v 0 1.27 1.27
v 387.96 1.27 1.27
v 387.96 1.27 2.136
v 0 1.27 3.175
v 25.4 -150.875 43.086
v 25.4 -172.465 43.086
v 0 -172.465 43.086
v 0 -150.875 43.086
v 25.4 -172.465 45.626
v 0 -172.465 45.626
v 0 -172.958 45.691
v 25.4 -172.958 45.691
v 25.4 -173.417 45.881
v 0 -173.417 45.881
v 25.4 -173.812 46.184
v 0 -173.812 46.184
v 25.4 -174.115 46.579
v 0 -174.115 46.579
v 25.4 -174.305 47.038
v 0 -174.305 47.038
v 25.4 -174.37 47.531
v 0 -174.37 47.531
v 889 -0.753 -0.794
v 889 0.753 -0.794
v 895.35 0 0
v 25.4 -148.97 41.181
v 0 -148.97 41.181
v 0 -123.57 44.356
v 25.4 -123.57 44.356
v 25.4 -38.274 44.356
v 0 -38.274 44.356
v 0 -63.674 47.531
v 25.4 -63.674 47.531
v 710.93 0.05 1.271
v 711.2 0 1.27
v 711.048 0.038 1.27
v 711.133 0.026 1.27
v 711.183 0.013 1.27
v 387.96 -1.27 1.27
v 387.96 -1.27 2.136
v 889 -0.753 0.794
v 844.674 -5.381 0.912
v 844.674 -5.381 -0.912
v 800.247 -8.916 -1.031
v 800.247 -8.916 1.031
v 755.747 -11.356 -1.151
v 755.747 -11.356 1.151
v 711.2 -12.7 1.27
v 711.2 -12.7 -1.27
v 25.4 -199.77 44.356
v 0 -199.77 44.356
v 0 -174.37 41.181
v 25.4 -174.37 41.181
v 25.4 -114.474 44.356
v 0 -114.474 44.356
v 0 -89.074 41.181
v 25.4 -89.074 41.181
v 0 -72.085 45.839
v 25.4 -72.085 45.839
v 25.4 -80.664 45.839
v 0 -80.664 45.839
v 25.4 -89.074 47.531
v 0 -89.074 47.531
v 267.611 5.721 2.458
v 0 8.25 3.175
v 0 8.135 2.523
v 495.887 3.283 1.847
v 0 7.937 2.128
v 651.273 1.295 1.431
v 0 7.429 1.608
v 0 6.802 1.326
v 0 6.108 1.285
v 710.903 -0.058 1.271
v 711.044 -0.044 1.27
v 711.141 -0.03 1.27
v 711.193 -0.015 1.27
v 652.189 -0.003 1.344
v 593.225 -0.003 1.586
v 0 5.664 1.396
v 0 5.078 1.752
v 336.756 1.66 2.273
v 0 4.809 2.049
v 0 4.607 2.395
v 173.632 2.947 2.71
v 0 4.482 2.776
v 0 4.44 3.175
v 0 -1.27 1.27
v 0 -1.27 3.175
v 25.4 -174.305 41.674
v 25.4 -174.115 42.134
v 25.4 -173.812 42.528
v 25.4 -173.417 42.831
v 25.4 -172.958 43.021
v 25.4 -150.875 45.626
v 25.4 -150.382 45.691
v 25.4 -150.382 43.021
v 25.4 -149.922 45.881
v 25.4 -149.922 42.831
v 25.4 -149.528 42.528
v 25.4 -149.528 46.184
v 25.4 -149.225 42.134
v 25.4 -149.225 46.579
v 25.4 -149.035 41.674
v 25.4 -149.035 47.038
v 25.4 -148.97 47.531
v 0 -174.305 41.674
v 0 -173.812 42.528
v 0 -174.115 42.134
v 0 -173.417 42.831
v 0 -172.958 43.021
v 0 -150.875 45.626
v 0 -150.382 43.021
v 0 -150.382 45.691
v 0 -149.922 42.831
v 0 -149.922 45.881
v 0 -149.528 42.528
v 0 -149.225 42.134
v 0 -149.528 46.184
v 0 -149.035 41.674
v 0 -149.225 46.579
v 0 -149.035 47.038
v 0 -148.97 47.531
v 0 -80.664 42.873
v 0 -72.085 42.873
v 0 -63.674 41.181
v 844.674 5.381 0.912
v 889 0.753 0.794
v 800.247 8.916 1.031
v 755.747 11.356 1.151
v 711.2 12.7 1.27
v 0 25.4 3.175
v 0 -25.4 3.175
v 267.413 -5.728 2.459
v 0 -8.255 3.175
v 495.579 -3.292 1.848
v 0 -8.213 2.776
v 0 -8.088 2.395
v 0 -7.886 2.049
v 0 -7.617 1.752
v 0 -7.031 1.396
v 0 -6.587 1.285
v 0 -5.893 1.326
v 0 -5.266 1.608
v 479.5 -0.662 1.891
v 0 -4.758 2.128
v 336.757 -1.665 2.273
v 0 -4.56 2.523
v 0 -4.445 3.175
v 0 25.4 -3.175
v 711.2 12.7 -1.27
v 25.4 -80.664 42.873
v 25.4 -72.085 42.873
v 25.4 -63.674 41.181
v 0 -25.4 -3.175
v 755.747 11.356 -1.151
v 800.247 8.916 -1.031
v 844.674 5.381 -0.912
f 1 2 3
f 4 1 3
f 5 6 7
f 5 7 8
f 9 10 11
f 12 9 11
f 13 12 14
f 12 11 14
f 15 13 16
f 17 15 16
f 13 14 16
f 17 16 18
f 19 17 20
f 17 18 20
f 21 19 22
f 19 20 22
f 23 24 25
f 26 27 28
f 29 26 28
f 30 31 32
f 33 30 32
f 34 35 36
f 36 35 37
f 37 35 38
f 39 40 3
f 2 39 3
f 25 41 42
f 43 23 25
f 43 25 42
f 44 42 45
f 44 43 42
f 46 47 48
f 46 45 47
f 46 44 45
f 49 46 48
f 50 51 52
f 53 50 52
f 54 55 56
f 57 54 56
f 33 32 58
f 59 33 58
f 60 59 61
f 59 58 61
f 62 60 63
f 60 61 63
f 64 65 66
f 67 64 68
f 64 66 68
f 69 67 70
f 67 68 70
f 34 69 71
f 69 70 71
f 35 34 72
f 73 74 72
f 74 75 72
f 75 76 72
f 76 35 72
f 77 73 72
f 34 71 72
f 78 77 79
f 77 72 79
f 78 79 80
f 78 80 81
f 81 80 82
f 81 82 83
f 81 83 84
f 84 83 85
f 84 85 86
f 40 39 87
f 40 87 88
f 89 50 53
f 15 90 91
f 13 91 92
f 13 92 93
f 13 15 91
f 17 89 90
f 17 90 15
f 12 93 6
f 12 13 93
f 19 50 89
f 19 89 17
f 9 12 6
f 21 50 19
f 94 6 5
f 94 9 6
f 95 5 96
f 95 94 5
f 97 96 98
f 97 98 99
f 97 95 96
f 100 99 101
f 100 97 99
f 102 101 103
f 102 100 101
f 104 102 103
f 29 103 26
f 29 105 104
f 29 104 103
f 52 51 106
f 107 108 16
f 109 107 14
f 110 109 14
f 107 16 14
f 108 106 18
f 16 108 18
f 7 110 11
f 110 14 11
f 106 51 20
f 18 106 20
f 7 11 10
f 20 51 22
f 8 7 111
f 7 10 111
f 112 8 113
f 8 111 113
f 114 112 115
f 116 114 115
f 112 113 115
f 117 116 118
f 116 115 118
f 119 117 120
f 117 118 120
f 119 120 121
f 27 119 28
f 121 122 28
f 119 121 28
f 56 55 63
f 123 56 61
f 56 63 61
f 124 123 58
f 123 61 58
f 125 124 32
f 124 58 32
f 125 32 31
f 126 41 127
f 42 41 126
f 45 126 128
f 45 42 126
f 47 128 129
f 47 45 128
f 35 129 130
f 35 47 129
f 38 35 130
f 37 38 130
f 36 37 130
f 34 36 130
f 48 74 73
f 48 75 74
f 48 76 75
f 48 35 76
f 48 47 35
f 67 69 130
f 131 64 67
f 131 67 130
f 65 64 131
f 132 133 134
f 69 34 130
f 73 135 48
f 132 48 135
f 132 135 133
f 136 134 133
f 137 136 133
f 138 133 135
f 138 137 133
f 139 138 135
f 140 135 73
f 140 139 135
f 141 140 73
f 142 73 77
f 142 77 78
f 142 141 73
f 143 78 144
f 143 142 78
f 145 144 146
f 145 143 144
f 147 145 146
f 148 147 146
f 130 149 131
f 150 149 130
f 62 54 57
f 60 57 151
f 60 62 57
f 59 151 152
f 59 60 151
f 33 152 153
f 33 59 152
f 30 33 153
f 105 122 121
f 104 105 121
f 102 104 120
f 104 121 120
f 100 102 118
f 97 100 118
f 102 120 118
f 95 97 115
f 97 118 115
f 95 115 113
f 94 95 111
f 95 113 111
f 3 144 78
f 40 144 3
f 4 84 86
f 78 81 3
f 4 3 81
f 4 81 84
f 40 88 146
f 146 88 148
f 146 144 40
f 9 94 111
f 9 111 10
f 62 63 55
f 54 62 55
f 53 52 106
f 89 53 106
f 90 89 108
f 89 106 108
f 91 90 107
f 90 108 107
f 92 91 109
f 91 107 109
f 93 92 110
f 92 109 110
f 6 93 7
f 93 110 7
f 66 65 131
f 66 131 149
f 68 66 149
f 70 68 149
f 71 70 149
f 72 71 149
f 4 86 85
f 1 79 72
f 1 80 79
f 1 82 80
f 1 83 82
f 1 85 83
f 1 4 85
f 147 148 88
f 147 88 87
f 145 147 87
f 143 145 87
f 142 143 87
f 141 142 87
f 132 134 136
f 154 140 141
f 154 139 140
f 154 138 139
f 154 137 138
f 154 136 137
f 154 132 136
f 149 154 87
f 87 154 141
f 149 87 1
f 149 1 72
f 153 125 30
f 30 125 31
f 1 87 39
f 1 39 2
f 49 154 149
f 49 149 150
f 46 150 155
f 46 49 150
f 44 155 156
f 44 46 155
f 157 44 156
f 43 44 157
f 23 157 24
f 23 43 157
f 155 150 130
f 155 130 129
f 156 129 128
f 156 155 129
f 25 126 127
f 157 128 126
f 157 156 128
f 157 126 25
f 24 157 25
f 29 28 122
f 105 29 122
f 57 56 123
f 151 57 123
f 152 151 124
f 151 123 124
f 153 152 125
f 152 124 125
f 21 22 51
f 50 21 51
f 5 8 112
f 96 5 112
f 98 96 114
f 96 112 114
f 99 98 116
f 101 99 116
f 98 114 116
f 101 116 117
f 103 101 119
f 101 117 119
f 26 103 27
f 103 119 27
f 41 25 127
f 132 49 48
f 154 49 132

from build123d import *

# Parameters (mm, degrees)
F1_DEPTH      = 25.4
F1_DEPTH_BACK = 25.4
F3_DEPTH      = 25.4
F3_DEPTH_BACK = 25.4
F6_R          = 1.905
F7_DEPTH      = 762
F9_R          = 1.9050067243
F10_DEPTH     = 762
F4_W          = 2.54
F4_H          = 19.05
F11_DEPTH     = 387.9596
F13_DEPTH     = 25.4


with BuildPart() as f1:
    # F0 (on Front) → F1 (new body, two sides)
    with BuildSketch(Plane.XZ) as f1_sk:
        with BuildLine():
            Line((889, 0.79375), (0, 3.175))
            Line((0, 3.175), (0, -3.175))
            Line((0, -3.175), (889, -0.79375))
            ThreePointArc((889, -0.79375), (892.1991750001, -0.5902750005), (895.35, 0))
            ThreePointArc((895.35, 0), (892.1991750001, 0.5902750005), (889, 0.79375))
        make_face()
    extrude(amount=F1_DEPTH)
    extrude(f1_sk.sketch, amount=-F1_DEPTH_BACK)

    # F2 (on Top) → F3 (cut, two sides)
    with BuildSketch(Plane.XY) as f3_sk:
        with BuildLine():
            Line((3.1591274952, 202.3111397314), (0, 25.4))
            Line((0, 25.4), (711.2, 12.7))
            ThreePointArc((711.2, 12.7), (803.4369640592, 8.6984788578), (895.35, 0))
            ThreePointArc((895.35, 0), (803.4369640592, -8.6984788578), (711.2, -12.7))
            Line((711.2, -12.7), (0, -25.4))
            Line((0, -25.4), (0, -301.8189966679))
            Line((0, -301.8189966679), (947.6996660233, -301.8189966679))
            Line((947.6996660233, -301.8189966679), (947.6996660233, 202.3111397314))
            Line((947.6996660233, 202.3111397314), (3.1591274952, 202.3111397314))
        make_face()
    extrude(amount=-F3_DEPTH, mode=Mode.SUBTRACT)
    extrude(f3_sk.sketch, amount=F3_DEPTH_BACK, mode=Mode.SUBTRACT)

    # F6 (on face) → F7 (cut)
    with BuildSketch(Plane(origin=(-0.2267676956, -0.0020247121, 0), x_dir=(-0.0089282179, 0.9999601427, 0), z_dir=(0.9999601427, 0.0089282179, 0))):
        with Locations((-6.3497469059, 3.175)):
            Circle(F6_R)
    extrude(amount=F7_DEPTH, mode=Mode.SUBTRACT)

    # F9 (on line) → F10 (cut)
    with BuildSketch(Plane(origin=(-0.6802307815, 0.0060734907, 0), x_dir=(-0.0089282179, -0.9999601427, 0), z_dir=(-0.9999601427, 0.0089282179, 0))):
        with Locations((-6.3446853275, 3.175)):
            Circle(F9_R)
    extrude(amount=-F10_DEPTH, mode=Mode.SUBTRACT)

    # F4 (on Right) → F11 (cut)
    with BuildSketch(Plane.YZ):
        with Locations((0, 10.795)):
            Rectangle(F4_W, F4_H)
    extrude(amount=F11_DEPTH, mode=Mode.SUBTRACT)


with BuildPart() as f13:
    # F12 (on Right) → F13 (new body)
    with BuildSketch(Plane.YZ):
        with BuildLine():
            Line((-174.3699965763, 47.5311353803), (-199.7699965763, 44.3561353803))
            Line((-199.7699965763, 44.3561353803), (-174.3699965763, 41.1811353803))
            ThreePointArc((-174.3699965763, 41.1811353803), (-173.8120349945, 42.5281737984), (-172.4649965763, 43.0861353803))
            Line((-172.4649965763, 43.0861353803), (-150.8749965763, 43.0861353803))
            ThreePointArc((-150.8749965763, 43.0861353803), (-149.5279581581, 42.5281737984), (-148.9699965763, 41.1811353803))
            Line((-148.9699965763, 41.1811353803), (-123.5699965763, 44.3561353803))
            Line((-123.5699965763, 44.3561353803), (-148.9699965763, 47.5311353803))
            ThreePointArc((-148.9699965763, 47.5311353803), (-149.5279581581, 46.1840969621), (-150.8749965763, 45.6261353803))
            Line((-150.8749965763, 45.6261353803), (-172.4649965763, 45.6261353803))
            ThreePointArc((-172.4649965763, 45.6261353803), (-173.8120349945, 46.1840969621), (-174.3699965763, 47.5311353803))
        make_face()
    extrude(amount=F13_DEPTH)


with BuildPart() as f13b:
    # F12 (on Right) → F13, piece 2 (new body)
    with BuildSketch(Plane.YZ):
        with BuildLine():
            Line((-89.0742935857, 47.5311353803), (-114.4742935857, 44.3561353803))
            Line((-114.4742935857, 44.3561353803), (-89.0742935857, 41.1811353803))
            ThreePointArc((-89.0742935857, 41.1811353803), (-76.3742935857, 43.0861353803), (-63.6742935857, 41.1811353803))
            Line((-63.6742935857, 41.1811353803), (-38.2742935857, 44.3561353803))
            Line((-38.2742935857, 44.3561353803), (-63.6742935857, 47.5311353803))
            ThreePointArc((-63.6742935857, 47.5311353803), (-76.3742935857, 45.6261353803), (-89.0742935857, 47.5311353803))
        make_face()
    extrude(amount=F13_DEPTH)


solid = Compound([f1.part, f13.part, f13b.part])
